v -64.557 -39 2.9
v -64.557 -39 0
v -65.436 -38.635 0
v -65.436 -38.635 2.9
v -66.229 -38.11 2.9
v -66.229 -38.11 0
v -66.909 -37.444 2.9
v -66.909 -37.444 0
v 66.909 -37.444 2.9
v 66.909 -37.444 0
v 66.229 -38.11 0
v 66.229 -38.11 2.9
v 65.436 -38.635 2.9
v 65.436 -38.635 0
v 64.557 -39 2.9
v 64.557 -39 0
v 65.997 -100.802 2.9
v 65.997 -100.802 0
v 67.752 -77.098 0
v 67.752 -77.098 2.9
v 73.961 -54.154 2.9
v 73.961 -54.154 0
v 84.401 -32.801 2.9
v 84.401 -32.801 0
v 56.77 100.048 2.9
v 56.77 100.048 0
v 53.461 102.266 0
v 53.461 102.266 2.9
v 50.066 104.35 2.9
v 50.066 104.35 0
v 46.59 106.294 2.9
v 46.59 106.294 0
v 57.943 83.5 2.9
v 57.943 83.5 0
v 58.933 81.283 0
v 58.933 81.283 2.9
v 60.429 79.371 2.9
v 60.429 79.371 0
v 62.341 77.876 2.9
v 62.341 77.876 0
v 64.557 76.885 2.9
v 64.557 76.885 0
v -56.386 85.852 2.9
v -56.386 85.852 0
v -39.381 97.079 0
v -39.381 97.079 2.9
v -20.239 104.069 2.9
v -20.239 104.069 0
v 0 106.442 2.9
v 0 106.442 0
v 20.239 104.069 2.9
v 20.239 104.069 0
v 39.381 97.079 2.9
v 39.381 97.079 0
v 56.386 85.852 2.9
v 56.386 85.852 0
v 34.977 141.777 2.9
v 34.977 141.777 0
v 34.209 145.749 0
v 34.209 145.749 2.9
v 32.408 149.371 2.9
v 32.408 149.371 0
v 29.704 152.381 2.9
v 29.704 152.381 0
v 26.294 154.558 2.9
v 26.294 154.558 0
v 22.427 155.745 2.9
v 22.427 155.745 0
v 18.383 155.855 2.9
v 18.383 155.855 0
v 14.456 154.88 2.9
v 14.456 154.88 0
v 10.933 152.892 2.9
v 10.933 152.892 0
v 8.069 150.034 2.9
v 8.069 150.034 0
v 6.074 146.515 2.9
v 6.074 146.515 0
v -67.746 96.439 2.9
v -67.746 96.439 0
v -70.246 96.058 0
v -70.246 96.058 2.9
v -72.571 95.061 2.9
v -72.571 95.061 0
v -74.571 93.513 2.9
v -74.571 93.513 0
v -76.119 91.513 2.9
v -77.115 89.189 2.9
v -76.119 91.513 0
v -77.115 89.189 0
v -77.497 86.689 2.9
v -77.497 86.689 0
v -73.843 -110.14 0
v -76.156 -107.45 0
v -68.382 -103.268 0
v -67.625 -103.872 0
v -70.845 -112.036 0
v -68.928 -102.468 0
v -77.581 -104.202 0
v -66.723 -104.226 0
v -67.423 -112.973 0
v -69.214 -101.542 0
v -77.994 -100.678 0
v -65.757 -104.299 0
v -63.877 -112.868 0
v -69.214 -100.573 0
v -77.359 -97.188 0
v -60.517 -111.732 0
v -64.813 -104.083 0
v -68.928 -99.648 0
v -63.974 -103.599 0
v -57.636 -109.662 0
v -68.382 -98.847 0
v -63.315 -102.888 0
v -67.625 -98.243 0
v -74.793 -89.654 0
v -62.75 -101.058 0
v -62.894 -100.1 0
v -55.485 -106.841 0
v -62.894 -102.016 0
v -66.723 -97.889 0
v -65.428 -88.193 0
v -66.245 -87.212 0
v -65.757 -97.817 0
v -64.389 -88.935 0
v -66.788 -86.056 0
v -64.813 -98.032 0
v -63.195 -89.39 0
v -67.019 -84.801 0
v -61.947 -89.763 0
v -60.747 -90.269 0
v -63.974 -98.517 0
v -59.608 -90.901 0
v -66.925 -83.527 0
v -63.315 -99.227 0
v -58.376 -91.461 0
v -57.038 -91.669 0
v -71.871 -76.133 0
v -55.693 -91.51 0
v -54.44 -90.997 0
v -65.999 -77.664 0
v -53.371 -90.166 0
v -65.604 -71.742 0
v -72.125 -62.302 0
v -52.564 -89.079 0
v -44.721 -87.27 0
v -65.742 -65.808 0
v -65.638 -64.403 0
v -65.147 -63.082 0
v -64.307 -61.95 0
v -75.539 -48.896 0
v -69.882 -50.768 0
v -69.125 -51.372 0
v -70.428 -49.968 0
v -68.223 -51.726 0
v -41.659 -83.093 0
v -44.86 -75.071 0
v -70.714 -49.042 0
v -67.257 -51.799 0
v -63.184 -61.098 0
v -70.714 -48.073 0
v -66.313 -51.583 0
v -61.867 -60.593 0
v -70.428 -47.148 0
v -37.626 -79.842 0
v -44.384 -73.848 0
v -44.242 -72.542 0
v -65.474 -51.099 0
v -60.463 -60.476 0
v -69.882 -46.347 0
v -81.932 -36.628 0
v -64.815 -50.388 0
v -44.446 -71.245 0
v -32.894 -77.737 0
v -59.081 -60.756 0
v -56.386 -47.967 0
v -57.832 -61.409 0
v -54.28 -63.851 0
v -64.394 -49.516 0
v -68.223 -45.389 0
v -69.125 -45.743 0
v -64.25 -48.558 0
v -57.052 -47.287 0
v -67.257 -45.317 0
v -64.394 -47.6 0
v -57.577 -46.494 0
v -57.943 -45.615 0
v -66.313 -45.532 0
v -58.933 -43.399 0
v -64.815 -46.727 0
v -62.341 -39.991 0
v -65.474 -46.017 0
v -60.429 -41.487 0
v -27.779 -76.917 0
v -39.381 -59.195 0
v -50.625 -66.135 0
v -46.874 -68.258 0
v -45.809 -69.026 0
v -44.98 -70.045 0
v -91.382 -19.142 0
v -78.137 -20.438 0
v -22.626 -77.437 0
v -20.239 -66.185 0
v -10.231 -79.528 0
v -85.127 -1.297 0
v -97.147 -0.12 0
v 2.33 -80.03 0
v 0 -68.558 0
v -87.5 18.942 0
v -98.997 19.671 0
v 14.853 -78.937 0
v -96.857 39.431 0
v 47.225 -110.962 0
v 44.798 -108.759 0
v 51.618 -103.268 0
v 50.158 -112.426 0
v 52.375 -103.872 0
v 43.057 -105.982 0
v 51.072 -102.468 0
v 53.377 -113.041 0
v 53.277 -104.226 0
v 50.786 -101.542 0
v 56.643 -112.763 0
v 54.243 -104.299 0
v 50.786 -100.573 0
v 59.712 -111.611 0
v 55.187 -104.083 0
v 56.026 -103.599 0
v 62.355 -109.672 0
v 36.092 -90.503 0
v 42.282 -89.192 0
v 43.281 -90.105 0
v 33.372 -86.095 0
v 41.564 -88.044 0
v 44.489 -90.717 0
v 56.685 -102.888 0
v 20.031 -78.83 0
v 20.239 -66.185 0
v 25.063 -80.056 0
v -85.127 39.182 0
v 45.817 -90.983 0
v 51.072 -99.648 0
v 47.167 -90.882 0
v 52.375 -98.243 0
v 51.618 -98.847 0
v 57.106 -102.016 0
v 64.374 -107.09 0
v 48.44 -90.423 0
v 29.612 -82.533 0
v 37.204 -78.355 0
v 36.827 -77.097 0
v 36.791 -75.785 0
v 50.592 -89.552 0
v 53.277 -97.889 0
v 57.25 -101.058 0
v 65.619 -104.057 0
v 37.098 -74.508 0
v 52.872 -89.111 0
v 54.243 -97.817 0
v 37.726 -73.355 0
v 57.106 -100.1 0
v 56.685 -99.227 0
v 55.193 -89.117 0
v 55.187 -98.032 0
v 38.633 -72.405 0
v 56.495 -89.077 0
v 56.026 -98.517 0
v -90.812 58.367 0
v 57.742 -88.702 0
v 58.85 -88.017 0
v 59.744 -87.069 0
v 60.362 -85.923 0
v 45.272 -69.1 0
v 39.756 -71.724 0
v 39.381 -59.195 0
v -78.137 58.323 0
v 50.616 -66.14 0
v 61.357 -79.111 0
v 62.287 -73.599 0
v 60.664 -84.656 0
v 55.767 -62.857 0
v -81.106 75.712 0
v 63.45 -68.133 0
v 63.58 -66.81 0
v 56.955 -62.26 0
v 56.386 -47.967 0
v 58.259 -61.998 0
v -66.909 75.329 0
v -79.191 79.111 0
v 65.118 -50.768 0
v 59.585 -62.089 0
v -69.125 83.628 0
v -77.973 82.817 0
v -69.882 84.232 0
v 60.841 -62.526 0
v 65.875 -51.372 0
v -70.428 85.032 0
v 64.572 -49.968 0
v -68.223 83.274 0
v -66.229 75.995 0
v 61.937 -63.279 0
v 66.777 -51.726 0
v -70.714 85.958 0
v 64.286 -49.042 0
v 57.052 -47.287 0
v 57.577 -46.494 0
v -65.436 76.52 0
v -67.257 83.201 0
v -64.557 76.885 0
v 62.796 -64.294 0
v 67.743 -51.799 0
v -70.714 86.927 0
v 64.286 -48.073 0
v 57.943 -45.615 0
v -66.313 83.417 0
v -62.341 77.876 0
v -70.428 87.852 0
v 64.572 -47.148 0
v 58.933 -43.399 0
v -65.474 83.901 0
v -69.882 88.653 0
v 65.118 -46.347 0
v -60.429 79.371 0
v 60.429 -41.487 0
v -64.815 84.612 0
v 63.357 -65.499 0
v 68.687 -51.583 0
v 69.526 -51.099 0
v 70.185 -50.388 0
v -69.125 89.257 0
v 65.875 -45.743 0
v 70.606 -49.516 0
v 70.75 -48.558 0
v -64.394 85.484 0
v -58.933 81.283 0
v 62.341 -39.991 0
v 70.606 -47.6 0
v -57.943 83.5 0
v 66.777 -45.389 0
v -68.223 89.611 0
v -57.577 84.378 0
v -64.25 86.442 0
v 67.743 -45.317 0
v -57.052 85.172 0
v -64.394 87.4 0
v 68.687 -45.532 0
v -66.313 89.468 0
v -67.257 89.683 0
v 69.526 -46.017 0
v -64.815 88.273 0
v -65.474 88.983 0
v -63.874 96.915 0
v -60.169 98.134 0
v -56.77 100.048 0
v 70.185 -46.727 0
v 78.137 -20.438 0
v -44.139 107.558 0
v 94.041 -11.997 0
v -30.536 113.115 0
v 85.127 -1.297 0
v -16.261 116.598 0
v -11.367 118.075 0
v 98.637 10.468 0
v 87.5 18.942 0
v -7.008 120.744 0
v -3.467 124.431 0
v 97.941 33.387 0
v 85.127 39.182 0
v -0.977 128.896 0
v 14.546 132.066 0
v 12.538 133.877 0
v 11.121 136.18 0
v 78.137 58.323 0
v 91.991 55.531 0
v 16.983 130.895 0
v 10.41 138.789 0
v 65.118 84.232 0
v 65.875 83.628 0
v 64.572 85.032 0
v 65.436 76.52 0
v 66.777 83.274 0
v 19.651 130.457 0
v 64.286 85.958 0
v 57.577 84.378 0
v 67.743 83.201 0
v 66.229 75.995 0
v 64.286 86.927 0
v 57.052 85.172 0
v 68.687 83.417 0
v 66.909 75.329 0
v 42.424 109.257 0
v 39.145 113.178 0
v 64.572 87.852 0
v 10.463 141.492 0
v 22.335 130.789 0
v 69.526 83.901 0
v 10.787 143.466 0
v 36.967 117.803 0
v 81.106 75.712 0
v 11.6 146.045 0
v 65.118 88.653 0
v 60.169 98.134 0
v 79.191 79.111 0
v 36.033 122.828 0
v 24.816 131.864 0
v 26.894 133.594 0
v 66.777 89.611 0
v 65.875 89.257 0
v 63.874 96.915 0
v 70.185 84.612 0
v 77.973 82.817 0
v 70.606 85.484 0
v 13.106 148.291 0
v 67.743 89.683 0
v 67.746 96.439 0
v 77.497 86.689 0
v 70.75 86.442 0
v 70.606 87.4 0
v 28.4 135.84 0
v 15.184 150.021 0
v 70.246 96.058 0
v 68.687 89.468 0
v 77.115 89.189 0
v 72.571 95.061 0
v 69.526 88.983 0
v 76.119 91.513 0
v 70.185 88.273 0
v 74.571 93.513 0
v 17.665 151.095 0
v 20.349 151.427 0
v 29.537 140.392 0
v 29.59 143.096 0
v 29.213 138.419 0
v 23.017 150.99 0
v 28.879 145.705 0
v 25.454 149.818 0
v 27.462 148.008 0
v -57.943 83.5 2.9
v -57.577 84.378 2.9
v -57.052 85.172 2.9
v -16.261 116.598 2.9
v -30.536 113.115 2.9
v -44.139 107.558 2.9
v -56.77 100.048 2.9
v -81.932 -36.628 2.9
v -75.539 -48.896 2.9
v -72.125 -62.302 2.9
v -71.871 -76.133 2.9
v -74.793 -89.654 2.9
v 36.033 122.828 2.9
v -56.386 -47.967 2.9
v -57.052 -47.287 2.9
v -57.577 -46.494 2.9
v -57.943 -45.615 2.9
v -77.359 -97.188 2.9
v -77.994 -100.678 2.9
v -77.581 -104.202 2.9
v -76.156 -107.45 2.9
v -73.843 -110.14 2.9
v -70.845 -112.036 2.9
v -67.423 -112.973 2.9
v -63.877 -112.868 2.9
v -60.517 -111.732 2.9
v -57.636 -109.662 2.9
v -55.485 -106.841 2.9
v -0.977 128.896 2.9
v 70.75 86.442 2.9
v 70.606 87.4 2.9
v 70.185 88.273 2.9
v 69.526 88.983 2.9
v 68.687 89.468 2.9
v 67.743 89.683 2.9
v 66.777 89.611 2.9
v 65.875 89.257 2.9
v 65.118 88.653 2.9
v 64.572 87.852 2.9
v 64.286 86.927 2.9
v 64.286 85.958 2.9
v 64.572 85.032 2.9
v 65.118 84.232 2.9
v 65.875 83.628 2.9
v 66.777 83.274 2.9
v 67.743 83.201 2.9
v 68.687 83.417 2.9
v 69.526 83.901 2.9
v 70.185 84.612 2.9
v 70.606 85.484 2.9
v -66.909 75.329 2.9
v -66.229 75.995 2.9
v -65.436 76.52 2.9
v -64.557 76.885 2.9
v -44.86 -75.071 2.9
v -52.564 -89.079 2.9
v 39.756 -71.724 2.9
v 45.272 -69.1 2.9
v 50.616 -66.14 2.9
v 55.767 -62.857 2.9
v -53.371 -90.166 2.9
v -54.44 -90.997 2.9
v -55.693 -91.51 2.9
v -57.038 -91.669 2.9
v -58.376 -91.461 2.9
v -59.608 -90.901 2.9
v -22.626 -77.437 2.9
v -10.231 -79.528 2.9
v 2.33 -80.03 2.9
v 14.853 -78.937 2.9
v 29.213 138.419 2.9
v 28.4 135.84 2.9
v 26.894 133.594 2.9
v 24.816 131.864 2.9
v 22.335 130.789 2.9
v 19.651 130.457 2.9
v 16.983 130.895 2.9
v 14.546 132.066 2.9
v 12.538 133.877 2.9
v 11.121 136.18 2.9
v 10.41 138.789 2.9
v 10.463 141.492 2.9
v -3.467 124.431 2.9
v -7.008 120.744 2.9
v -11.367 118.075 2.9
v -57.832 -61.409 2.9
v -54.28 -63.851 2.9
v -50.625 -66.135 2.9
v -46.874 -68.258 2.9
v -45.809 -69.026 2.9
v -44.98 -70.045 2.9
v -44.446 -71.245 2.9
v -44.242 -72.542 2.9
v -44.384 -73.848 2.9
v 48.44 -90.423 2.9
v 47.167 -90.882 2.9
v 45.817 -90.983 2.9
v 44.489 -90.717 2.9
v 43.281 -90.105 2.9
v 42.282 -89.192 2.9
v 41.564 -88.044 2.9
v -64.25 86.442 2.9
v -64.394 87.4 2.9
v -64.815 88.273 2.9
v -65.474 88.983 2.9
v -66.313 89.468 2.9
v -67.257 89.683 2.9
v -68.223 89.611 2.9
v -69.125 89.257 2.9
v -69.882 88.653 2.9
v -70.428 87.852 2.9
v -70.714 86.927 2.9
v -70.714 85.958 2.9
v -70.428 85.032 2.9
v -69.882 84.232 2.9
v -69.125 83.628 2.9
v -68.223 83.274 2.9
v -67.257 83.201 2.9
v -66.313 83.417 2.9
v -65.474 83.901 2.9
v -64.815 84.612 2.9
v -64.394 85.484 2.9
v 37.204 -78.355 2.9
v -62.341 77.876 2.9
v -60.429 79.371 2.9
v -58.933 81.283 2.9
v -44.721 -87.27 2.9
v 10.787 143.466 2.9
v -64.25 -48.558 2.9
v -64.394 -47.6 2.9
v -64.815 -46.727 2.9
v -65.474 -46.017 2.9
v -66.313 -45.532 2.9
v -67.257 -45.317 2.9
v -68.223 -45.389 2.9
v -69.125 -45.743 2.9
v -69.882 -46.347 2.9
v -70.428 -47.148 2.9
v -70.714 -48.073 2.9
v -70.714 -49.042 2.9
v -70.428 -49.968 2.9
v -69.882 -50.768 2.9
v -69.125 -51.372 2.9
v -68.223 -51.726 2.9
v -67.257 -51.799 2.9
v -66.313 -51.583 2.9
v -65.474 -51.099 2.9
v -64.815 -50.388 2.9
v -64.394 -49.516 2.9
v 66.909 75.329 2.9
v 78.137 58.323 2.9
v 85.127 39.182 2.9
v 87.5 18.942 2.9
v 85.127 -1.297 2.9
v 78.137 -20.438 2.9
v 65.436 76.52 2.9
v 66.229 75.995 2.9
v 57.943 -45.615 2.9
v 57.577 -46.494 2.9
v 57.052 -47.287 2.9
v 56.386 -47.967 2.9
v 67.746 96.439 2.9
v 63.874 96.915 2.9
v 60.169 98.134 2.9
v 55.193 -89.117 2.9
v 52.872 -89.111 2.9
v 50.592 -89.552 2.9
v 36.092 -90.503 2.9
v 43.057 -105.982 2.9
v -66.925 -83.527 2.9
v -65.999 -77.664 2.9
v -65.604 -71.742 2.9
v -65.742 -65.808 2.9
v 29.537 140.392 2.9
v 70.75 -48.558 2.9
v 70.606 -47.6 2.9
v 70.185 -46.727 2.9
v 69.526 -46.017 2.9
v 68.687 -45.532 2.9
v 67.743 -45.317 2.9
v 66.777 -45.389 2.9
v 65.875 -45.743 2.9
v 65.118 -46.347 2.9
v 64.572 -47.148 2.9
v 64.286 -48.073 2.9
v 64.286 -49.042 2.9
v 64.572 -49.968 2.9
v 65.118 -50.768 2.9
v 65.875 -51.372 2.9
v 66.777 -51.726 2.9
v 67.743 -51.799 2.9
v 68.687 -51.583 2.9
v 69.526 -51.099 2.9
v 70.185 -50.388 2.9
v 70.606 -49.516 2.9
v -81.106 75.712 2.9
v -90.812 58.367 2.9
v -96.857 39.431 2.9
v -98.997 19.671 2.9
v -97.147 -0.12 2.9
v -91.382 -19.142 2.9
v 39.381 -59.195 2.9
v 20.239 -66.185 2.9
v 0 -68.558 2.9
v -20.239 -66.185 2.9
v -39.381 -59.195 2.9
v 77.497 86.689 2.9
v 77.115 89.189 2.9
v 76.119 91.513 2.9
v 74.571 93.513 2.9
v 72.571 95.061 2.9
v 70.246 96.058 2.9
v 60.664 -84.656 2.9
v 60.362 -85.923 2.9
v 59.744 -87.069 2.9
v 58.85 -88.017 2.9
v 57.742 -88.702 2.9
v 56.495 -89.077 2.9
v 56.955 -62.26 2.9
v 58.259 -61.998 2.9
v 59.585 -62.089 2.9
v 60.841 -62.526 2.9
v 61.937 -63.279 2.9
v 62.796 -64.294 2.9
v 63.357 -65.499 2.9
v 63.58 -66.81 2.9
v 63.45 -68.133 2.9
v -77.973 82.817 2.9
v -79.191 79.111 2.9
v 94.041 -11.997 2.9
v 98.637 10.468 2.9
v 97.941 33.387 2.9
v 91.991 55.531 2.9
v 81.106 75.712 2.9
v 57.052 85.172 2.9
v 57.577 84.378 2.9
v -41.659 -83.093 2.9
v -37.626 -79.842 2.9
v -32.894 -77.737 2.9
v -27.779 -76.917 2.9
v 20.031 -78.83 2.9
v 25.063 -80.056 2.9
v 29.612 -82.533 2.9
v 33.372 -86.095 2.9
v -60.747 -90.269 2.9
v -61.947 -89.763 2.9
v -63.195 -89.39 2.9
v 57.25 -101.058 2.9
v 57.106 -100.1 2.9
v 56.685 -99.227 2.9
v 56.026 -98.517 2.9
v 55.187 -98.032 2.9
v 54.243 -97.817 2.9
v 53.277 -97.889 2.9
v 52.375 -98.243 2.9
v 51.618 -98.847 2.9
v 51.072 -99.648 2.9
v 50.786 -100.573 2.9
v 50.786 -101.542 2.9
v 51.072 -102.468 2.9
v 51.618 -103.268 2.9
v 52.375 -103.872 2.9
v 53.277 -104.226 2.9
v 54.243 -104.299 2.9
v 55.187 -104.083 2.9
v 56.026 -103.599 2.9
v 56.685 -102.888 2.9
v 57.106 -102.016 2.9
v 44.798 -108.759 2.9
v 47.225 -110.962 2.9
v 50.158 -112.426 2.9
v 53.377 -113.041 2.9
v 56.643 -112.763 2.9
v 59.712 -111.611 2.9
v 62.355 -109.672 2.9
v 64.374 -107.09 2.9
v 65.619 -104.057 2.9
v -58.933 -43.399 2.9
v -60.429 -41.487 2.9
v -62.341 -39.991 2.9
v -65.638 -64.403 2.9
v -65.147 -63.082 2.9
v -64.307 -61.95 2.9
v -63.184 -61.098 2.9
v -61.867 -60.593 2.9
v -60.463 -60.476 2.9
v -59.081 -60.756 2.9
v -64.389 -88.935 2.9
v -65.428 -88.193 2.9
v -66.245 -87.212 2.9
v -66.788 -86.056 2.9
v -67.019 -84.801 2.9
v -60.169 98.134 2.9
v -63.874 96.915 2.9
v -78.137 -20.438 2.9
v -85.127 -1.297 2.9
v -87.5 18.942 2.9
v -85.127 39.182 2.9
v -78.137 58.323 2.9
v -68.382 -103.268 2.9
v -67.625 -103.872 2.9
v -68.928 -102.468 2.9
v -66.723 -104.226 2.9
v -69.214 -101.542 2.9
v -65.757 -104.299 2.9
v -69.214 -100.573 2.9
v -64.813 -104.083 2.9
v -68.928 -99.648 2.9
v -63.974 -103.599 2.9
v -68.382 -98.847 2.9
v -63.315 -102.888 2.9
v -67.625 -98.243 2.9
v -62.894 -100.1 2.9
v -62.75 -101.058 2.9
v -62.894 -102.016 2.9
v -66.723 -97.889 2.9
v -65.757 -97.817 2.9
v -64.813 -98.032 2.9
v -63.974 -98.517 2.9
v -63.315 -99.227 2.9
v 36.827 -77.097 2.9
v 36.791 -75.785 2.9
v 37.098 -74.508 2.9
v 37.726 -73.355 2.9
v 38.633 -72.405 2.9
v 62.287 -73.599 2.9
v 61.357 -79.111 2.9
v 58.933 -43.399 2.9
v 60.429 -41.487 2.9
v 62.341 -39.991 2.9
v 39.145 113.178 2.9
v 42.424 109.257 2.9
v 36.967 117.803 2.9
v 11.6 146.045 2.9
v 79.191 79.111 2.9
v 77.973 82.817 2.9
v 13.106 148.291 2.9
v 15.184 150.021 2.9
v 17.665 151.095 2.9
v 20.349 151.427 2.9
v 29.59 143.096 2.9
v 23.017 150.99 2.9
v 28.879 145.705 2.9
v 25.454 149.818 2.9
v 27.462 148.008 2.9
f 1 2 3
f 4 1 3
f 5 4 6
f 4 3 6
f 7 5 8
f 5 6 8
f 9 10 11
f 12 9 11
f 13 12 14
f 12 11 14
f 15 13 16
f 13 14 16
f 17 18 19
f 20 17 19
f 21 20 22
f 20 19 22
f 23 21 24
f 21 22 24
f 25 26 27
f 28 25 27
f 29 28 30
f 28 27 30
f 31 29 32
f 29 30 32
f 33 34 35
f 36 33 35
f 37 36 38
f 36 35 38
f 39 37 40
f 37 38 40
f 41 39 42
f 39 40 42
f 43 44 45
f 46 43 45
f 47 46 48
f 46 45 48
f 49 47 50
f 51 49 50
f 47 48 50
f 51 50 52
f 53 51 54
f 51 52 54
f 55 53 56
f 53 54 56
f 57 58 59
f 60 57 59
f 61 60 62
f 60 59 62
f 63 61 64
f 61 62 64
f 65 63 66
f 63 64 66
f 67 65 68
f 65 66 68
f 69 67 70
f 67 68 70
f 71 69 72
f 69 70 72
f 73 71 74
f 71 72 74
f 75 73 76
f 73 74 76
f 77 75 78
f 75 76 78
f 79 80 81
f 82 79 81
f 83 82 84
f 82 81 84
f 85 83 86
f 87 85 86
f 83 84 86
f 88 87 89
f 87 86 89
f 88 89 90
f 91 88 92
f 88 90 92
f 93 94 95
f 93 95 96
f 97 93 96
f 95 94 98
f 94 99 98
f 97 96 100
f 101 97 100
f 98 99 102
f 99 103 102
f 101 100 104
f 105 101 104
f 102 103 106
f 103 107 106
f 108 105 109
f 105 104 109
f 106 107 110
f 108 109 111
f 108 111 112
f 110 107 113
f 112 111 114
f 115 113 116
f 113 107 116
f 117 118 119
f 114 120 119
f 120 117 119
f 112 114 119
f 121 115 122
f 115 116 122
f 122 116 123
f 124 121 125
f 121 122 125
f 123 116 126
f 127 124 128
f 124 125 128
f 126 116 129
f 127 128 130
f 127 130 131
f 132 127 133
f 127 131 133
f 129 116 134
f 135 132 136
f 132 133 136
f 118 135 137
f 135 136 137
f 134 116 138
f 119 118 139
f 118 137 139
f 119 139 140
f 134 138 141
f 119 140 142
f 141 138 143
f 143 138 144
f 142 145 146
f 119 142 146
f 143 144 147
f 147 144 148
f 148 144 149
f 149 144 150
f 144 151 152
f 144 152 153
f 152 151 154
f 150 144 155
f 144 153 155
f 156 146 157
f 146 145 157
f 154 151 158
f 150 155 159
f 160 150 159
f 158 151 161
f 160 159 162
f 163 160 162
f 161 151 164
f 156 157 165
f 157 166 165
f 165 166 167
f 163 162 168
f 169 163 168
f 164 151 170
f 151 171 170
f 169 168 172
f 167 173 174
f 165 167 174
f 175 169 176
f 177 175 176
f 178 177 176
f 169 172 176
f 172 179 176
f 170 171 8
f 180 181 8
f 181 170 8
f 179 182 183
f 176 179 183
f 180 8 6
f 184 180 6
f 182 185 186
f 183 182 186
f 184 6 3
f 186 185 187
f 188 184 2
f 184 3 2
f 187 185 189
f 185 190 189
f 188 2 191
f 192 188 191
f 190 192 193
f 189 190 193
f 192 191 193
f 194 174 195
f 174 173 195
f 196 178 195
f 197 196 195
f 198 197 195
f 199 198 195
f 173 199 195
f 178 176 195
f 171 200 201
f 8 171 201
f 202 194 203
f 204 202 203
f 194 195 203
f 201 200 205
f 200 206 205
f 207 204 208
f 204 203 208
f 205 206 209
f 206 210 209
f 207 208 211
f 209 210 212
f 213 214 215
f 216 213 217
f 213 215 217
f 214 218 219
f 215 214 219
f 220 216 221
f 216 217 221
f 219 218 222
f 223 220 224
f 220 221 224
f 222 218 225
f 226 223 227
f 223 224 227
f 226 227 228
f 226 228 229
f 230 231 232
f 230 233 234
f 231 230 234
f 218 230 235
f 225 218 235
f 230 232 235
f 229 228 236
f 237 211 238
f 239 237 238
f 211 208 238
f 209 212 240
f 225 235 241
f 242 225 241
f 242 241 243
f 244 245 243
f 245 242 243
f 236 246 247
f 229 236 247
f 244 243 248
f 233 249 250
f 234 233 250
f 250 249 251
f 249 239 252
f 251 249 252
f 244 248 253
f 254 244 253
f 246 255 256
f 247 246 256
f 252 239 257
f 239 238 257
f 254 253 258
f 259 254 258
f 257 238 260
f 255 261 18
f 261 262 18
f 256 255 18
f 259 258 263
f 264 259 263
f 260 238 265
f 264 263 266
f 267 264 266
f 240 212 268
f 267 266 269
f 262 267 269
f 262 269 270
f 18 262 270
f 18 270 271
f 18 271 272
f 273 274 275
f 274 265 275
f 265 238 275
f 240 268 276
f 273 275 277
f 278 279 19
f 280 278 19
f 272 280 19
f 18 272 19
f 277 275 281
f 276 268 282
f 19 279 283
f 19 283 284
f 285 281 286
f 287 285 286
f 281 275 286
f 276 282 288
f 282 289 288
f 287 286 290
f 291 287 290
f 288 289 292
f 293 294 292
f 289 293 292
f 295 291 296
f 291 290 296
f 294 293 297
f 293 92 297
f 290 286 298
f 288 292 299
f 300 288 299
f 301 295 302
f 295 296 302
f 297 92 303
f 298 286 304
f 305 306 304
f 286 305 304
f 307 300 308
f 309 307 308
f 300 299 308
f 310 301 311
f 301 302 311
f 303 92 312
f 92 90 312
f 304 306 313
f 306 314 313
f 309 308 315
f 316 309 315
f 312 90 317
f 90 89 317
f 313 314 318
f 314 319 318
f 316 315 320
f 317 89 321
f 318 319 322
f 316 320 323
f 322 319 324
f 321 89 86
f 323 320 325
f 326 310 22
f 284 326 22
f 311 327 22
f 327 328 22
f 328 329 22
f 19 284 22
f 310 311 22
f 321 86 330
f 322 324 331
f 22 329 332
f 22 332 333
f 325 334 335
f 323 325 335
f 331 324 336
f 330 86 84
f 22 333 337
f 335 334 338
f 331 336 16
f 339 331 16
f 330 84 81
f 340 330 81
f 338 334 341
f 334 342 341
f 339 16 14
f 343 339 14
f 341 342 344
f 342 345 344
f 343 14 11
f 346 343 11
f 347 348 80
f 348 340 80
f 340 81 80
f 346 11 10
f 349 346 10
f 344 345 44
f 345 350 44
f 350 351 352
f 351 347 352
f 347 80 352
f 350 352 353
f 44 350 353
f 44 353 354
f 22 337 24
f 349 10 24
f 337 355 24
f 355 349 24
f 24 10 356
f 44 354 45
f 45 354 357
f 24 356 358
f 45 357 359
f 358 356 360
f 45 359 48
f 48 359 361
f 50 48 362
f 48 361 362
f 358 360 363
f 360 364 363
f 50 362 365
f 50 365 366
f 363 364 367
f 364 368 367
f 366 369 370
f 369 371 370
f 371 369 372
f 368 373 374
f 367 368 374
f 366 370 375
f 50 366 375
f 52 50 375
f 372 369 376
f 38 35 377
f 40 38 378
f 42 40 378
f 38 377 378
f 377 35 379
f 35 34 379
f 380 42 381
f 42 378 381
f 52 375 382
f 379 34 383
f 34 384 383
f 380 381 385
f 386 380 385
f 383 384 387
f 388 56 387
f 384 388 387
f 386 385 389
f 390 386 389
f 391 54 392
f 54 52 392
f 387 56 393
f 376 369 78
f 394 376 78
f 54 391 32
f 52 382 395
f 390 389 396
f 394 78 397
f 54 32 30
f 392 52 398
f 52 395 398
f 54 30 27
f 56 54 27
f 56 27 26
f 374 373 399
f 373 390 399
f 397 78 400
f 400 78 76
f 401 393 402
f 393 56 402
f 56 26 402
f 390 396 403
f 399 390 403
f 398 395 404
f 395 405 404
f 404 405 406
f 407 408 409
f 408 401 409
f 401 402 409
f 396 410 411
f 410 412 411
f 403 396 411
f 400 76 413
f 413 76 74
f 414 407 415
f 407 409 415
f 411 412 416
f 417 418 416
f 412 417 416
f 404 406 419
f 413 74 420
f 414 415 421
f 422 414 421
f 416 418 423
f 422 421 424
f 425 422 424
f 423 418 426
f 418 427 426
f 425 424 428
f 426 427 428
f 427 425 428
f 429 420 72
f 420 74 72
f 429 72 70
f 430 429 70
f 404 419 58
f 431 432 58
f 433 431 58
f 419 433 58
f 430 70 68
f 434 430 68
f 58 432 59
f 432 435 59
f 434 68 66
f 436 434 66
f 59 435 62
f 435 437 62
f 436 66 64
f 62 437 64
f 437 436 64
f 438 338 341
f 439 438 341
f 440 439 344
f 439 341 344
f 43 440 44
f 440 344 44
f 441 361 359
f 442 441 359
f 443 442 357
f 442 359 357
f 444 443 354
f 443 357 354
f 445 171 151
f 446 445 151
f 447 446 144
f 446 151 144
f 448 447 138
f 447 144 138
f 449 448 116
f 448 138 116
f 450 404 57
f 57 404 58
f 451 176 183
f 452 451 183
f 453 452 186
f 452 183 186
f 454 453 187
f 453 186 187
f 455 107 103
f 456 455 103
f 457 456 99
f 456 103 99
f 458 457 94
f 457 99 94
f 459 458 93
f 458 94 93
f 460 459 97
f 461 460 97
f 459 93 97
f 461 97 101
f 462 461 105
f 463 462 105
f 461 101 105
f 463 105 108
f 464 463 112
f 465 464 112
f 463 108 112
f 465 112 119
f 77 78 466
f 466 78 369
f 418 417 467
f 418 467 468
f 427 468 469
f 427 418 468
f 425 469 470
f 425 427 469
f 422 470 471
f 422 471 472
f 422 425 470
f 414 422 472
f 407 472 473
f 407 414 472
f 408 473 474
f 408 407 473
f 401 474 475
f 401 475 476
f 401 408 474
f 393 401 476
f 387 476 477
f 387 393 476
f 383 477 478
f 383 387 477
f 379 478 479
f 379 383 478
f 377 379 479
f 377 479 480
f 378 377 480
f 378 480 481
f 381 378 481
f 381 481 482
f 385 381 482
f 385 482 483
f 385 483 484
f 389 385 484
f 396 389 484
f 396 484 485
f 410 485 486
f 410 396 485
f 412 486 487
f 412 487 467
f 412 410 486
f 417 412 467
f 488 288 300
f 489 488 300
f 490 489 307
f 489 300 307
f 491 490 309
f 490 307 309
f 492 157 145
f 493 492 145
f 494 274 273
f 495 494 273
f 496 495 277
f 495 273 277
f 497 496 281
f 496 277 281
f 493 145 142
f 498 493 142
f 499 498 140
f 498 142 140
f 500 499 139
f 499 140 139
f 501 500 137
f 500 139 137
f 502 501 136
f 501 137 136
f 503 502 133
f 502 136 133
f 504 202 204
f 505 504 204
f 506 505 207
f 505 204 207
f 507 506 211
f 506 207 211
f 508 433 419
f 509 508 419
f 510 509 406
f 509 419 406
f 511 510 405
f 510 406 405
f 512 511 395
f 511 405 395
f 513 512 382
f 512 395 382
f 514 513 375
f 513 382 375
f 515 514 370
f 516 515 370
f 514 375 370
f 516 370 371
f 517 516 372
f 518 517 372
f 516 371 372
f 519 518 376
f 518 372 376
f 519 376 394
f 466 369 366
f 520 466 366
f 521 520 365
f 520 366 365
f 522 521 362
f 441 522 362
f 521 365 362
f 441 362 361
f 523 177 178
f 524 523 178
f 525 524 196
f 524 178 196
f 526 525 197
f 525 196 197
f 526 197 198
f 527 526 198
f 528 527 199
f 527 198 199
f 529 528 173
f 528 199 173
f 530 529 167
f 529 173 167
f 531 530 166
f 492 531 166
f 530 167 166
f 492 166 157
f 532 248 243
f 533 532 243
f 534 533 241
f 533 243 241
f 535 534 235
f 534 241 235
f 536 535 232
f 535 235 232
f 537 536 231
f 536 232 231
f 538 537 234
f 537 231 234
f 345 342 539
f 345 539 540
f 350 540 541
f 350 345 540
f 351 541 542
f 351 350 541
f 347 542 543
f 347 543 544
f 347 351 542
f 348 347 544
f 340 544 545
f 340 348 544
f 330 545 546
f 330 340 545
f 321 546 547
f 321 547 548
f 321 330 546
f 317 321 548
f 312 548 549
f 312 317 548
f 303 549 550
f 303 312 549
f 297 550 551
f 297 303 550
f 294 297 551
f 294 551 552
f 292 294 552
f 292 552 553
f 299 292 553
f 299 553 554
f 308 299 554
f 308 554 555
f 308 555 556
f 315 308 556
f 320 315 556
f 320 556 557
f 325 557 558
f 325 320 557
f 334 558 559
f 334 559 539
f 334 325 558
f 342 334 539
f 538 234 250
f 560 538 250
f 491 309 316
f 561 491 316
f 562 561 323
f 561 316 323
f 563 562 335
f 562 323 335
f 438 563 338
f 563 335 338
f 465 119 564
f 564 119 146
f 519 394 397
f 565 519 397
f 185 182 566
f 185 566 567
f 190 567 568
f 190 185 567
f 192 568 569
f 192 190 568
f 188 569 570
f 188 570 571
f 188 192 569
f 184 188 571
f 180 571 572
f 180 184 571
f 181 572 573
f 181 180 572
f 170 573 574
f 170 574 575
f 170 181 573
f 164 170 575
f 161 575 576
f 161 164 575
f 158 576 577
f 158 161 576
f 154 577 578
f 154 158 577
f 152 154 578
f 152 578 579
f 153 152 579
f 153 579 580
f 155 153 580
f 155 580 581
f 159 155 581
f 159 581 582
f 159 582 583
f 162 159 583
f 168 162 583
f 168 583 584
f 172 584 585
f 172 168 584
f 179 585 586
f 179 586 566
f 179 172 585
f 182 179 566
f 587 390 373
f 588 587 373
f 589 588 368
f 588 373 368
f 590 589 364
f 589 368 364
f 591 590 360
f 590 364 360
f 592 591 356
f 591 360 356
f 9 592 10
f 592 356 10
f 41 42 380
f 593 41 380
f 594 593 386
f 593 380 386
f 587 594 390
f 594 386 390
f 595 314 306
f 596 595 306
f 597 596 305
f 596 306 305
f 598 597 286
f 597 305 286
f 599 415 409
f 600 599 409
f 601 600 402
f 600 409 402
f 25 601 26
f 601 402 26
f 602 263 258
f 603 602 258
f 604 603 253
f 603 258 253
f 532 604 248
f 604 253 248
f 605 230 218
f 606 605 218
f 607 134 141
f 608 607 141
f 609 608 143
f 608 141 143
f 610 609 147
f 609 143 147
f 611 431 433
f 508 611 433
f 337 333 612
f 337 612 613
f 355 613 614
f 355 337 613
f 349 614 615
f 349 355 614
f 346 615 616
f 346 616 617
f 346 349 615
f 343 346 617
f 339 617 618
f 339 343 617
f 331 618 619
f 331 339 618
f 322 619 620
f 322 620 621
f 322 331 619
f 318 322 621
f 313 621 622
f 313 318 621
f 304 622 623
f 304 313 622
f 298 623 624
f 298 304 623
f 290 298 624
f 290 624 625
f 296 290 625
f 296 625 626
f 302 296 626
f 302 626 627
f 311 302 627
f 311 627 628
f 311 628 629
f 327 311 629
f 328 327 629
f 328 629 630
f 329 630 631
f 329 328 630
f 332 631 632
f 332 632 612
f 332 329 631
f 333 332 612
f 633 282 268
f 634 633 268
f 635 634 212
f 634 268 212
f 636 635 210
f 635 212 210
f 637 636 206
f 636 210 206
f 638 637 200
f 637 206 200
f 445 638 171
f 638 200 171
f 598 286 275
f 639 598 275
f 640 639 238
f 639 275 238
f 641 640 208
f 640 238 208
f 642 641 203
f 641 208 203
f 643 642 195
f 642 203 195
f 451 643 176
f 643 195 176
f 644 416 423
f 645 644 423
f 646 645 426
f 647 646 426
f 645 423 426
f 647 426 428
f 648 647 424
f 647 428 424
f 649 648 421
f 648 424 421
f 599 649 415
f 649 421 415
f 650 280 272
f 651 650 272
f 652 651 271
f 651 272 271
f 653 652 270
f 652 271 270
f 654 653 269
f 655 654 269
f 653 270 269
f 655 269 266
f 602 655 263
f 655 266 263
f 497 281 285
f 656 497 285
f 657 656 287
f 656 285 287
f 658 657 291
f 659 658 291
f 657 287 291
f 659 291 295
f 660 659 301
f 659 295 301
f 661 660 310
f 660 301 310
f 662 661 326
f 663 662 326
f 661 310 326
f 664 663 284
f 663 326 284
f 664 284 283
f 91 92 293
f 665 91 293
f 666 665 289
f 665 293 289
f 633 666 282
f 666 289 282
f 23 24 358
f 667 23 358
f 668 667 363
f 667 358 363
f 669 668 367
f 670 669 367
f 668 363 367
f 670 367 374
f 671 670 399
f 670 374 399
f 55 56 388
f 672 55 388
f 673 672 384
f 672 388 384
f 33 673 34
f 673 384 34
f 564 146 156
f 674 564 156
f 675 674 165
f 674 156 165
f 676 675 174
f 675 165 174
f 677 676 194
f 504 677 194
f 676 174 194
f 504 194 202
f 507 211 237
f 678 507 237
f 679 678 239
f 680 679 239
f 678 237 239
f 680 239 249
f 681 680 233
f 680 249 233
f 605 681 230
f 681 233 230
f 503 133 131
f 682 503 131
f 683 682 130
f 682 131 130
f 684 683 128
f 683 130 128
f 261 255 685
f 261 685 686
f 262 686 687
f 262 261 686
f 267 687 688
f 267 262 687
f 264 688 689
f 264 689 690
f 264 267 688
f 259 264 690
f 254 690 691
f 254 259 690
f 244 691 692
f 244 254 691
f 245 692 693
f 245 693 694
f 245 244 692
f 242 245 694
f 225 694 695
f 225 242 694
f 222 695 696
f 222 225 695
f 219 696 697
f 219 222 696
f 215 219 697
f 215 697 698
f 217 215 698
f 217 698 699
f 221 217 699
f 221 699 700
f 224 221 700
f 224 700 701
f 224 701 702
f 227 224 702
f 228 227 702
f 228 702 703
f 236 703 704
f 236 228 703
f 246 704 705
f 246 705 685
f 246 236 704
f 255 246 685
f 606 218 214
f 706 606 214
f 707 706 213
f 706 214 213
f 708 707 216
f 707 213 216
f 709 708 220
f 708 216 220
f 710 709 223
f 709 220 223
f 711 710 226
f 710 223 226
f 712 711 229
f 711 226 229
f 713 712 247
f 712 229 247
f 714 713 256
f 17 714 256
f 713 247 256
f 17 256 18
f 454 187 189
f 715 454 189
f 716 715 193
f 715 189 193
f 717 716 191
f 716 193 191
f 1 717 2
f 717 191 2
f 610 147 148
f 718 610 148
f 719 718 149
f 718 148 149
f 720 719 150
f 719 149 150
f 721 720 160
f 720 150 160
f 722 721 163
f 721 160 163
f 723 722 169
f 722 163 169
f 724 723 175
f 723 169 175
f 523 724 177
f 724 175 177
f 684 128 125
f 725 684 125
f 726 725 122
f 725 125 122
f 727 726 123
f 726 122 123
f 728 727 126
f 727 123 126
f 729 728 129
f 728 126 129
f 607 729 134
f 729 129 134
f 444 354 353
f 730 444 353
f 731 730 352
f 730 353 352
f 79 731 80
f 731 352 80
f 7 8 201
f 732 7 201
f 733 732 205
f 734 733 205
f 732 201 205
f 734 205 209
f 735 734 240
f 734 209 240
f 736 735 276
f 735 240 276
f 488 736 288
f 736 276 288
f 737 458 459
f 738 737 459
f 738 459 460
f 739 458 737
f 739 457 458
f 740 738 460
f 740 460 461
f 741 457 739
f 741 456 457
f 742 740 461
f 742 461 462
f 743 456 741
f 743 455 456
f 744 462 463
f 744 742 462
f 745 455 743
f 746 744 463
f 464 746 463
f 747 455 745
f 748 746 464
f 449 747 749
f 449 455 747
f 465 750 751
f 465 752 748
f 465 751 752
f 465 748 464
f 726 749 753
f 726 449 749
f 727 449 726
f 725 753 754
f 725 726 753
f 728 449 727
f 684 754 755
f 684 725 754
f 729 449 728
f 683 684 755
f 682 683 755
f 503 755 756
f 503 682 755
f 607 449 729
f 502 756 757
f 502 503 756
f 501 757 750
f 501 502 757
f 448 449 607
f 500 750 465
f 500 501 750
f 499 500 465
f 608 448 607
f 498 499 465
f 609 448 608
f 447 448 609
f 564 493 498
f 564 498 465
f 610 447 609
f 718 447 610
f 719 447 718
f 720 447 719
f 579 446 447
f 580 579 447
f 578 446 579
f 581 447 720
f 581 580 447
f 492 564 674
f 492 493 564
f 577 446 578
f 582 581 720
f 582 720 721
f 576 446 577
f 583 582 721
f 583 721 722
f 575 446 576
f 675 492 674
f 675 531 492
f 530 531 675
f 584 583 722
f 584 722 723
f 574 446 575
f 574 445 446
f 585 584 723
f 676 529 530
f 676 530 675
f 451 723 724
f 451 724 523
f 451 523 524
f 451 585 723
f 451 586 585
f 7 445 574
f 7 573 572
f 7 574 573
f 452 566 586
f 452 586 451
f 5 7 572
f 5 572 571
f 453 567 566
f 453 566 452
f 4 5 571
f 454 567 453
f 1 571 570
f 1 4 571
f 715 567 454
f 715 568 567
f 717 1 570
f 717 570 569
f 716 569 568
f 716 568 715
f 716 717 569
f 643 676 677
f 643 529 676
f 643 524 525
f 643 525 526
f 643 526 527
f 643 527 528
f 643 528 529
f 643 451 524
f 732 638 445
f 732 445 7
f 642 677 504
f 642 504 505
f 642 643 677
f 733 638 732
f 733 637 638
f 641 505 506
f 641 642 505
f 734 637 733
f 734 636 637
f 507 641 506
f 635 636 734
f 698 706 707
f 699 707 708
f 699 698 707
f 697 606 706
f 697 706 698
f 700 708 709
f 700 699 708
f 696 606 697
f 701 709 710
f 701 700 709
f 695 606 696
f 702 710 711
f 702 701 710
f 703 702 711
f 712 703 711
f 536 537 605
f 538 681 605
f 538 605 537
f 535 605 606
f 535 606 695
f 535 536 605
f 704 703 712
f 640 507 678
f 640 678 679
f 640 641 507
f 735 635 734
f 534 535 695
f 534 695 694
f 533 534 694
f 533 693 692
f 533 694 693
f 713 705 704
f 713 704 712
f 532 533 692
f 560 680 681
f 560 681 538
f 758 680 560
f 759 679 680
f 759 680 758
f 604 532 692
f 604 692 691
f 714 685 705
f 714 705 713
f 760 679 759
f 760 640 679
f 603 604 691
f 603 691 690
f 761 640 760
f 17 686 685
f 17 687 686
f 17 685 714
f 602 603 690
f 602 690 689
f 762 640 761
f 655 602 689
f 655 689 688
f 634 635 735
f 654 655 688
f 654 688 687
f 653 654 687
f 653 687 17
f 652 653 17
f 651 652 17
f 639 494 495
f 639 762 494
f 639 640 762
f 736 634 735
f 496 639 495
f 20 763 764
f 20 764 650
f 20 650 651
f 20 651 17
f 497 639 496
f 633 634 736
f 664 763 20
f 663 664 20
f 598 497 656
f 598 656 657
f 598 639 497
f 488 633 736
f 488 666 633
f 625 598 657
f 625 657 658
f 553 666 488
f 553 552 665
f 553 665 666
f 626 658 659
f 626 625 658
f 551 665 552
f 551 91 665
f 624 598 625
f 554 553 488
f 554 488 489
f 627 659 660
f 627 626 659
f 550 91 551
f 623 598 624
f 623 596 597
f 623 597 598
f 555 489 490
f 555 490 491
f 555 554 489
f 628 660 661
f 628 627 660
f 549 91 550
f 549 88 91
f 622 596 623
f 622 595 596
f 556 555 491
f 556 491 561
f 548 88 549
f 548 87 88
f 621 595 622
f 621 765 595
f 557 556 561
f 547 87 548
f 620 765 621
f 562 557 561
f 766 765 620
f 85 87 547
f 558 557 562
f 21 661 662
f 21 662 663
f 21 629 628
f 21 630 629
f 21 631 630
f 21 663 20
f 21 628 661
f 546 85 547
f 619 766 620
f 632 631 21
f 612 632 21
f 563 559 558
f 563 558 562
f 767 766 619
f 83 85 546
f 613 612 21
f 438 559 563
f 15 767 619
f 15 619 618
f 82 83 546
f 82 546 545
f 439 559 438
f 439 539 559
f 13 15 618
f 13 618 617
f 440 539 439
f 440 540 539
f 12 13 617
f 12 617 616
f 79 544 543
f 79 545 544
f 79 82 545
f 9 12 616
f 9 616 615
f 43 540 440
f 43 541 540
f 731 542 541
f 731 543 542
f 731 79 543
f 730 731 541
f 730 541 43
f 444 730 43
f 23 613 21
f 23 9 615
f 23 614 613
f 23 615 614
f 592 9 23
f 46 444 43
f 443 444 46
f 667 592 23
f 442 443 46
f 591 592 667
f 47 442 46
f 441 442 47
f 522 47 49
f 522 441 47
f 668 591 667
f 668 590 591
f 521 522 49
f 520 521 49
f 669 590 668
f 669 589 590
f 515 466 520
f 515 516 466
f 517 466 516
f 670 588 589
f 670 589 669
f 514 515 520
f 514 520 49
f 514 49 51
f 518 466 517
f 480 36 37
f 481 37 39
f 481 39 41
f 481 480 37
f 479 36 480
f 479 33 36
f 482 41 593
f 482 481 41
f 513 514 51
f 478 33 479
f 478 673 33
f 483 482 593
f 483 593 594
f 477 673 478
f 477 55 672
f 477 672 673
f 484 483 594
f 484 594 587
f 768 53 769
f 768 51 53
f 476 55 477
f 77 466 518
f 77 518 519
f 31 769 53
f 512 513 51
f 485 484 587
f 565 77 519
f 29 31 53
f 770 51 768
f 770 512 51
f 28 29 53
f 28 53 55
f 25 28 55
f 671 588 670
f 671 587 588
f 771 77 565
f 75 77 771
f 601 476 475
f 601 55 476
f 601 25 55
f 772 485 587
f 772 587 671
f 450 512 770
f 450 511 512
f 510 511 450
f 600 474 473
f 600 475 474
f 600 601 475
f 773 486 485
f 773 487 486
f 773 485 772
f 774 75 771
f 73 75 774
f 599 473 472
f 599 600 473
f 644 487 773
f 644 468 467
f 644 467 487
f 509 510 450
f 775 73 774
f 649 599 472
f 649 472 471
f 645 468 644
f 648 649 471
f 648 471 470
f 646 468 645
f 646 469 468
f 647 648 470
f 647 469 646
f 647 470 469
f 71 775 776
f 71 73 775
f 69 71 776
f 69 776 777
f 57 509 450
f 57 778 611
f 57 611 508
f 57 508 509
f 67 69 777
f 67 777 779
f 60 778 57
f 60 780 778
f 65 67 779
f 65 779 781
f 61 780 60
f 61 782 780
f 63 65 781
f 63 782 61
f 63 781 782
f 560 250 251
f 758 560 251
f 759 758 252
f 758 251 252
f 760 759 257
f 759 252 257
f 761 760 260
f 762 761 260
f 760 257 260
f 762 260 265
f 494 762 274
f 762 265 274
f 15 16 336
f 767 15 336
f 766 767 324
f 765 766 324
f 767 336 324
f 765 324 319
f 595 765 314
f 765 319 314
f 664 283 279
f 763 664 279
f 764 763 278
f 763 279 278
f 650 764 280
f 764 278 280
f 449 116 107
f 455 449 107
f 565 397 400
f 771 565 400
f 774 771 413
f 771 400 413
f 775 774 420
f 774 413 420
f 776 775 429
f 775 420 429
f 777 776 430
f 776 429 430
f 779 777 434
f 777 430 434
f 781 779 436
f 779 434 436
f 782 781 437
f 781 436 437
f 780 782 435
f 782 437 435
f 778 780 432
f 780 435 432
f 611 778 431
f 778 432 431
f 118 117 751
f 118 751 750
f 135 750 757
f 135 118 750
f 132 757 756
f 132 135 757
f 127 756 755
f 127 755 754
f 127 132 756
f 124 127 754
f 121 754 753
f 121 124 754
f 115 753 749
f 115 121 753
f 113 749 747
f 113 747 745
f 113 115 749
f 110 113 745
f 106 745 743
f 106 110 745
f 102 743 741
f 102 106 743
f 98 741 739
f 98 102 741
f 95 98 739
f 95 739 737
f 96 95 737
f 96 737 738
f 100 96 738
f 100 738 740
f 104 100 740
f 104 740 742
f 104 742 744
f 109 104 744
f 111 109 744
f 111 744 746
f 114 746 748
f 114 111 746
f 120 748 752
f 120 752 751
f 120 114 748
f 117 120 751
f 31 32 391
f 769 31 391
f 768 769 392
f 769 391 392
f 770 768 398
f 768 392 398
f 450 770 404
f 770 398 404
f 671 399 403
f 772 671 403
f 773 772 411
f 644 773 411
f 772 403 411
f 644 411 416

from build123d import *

# Parameters (mm, degrees)
F0_R     = 3.25
F1_DEPTH = 2.9


# Not quite as in the source:
# - ends of sketch curves that miss each other by under 0.0002 mm in the source are joined


with BuildPart() as f1:
    # F0 (on Top) → F1 (new body)
    with BuildSketch(Plane.XY):
        with BuildLine():
            ThreePointArc((-44.7213694768, -87.2696897378), (-35.3282259069, -78.6355727138), (-22.6261189451, -77.437406766))
            ThreePointArc((-22.6261189451, -77.437406766), (-3.9584138319, -79.9784717794), (14.8526419701, -78.9371528028))
            ThreePointArc((14.8526419701, -78.9371528028), (27.4184013914, -81.1464387638), (36.0916099164, -90.5034990376))
            Line((36.0916099164, -90.5034990376), (43.056946, -105.982018))
            ThreePointArc((43.056946, -105.982018), (56.6433108611, -112.762891287), (65.9972675289, -100.8015700101))
            ThreePointArc((65.9972675289, -100.8015700101), (70.3098677706, -65.4781038722), (84.4013998186, -32.8012868888))
            ThreePointArc((84.4013998186, -32.8012868888), (98.9543772418, 21.9475596078), (81.1058809507, 75.7123879655))
            ThreePointArc((81.1058809507, 75.7123879655), (78.4915241697, 80.9342205742), (77.4969704068, 86.68861601))
            ThreePointArc((77.4969704068, 86.68861601), (74.5710678119, 93.5134278119), (67.7462419947, 96.4393277843))
            ThreePointArc((67.7462419947, 96.4393277843), (61.9918305742, 97.4338841697), (56.7700159448, 100.0482399211))
            ThreePointArc((56.7700159448, 100.0482399211), (51.7741884012, 103.3250206324), (46.589782882, 106.2944757787))
            ThreePointArc((46.589782882, 106.2944757787), (39.1449717302, 113.1782098516), (36.0328533434, 122.8283870191))
            Line((36.0328533434, 122.8283870191), (34.976746, 141.777077))
            ThreePointArc((34.976746, 141.777077), (22.4266252093, 155.7447750088), (6.0736789634, 146.5152930146))
            Line((6.0736789634, 146.5152930146), (-0.977233, 128.895637))
            ThreePointArc((-0.977233, 128.895637), (-7.0076373704, 120.7442287718), (-16.2606700755, 116.5978324535))
            ThreePointArc((-16.2606700755, 116.5978324535), (-37.4411993299, 110.5892726198), (-56.7700327307, 100.0482376153))
            ThreePointArc((-56.7700327307, 100.0482376153), (-61.9918290994, 97.4338843258), (-67.7462240106, 96.4393304314))
            ThreePointArc((-67.7462240106, 96.4393304314), (-74.5710678119, 93.5134278119), (-77.4969677843, 86.6886019947))
            ThreePointArc((-77.4969677843, 86.6886019947), (-78.4915233258, 80.9342200994), (-81.1058789211, 75.7124059448))
            ThreePointArc((-81.1058789211, 75.7124059448), (-98.9973221942, 19.6705072268), (-81.9321709394, -36.6284899589))
            ThreePointArc((-81.9321709394, -36.6284899589), (-72.1246020826, -62.3015797591), (-74.7927308672, -89.6544180452))
            Line((-74.7927308672, -89.6544180452), (-77.359069, -97.188309))
            ThreePointArc((-77.359069, -97.188309), (-70.8446126339, -112.0362432093), (-55.4854090748, -106.8406649589))
            Line((-55.4854090748, -106.8406649589), (-44.7213694768, -87.2696897378))
        make_face()
        with Locations((-66, -101.05764)):
            Circle(F0_R, mode=Mode.SUBTRACT)
        with BuildLine():
            ThreePointArc((-52.5642634566, -89.0792787489), (-55.6931843813, -91.5103563164), (-59.6084751577, -90.9014372506))
            ThreePointArc((-59.6084751577, -90.9014372506), (-61.3402321592, -89.9993144635), (-63.1953610952, -89.3899923959))
            ThreePointArc((-63.1953610952, -89.3899923959), (-66.2453647932, -87.2123878479), (-66.9254446607, -83.5270150694))
            ThreePointArc((-66.9254446607, -83.5270150694), (-65.7348712362, -74.7077507104), (-65.7415821416, -65.8084890097))
            ThreePointArc((-65.7415821416, -65.8084890097), (-63.1835418456, -61.0980378443), (-57.8323762514, -61.4094713493))
            ThreePointArc((-57.8323762514, -61.4094713493), (-52.4648777131, -65.01260773), (-46.8736571173, -68.2577562181))
            ThreePointArc((-46.8736571173, -68.2577562181), (-44.4460535436, -71.2446768384), (-44.8599474566, -75.0713907489))
            Line((-44.8599474566, -75.0713907489), (-52.5642634566, -89.0792787489))
        make_face(mode=Mode.SUBTRACT)
        with Locations((-67.5, -48.55764)):
            Circle(F0_R, mode=Mode.SUBTRACT)
        with Locations((54, -101.05764)):
            Circle(F0_R, mode=Mode.SUBTRACT)
        with BuildLine():
            ThreePointArc((55.7668649484, -62.8565289244), (61.4137793469, -62.8660371217), (63.450485388, -68.1328730913))
            ThreePointArc((63.450485388, -68.1328730913), (61.7927741104, -76.349981087), (60.66398801, -84.656313001))
            ThreePointArc((60.66398801, -84.656313001), (58.8502515766, -88.0169614514), (55.1933120197, -89.1171158029))
            ThreePointArc((55.1933120197, -89.1171158029), (51.7212938161, -89.2759806038), (48.4404431818, -90.4231993478))
            ThreePointArc((48.4404431818, -90.4231993478), (44.4890186454, -90.7173209458), (41.5643552496, -88.0440028877))
            Line((41.5643552496, -88.0440028877), (37.204438, -78.355278))
            ThreePointArc((37.204438, -78.355278), (37.0976309763, -74.5077318057), (39.7561530447, -71.7243331019))
            ThreePointArc((39.7561530447, -71.7243331019), (47.9668749837, -67.6612132767), (55.7668649484, -62.8565289244))
        make_face(mode=Mode.SUBTRACT)
        with Locations((67.5, -48.55764)):
            Circle(F0_R, mode=Mode.SUBTRACT)
        with BuildLine():
            ThreePointArc((-57.9428097278, 83.4995499162), (-57.3338219129, 84.7875612773), (-56.3862887981, 85.8515257605))
            ThreePointArc((-56.3862887981, 85.8515257605), (-1.4091e-06, 106.44236), (56.3862897755, 85.8515247336))
            ThreePointArc((56.3862897755, 85.8515247336), (57.3338226492, 84.7875616758), (57.9428104466, 83.4995508296))
            ThreePointArc((57.9428104466, 83.4995508296), (60.4289318502, 79.371292526), (64.557188973, 76.8851709122))
            ThreePointArc((64.557188973, 76.8851709122), (65.8452017985, 76.276181568), (66.9091657605, 75.3286487981))
            ThreePointArc((66.9091657605, 75.3286487981), (87.5, 18.94236), (66.9091656417, -37.443928698))
            ThreePointArc((66.9091656417, -37.443928698), (65.8452017985, -38.391461568), (64.5571911108, -39.00044936))
            ThreePointArc((64.5571911108, -39.00044936), (60.4289318502, -41.486572526), (57.942810631, -45.6148298864))
            ThreePointArc((57.942810631, -45.6148298864), (57.3338226492, -46.9028416758), (56.3862897981, -47.9668057605))
            ThreePointArc((56.3862897981, -47.9668057605), (-1.4091e-06, -68.55764), (-56.3862919305, -47.9668029175))
            ThreePointArc((-56.3862919305, -47.9668029175), (-57.3338219129, -46.9028412773), (-57.9428097278, -45.6148299162))
            ThreePointArc((-57.9428097278, -45.6148299162), (-60.4289318502, -41.486572526), (-64.5571880596, -39.0004511935))
            ThreePointArc((-64.5571880596, -39.0004511935), (-65.8452006758, -38.3914616492), (-66.9091647605, -37.4439287981))
            ThreePointArc((-66.9091647605, -37.4439287981), (-87.5, 18.94236), (-66.9091638256, 75.328650853))
            ThreePointArc((-66.9091638256, 75.328650853), (-65.8452006758, 76.2761816492), (-64.5571898296, 76.8851694466))
            ThreePointArc((-64.5571898296, 76.8851694466), (-60.4289318502, 79.371292526), (-57.9428097278, 83.4995499162))
        make_face(mode=Mode.SUBTRACT)
        with Locations((-67.5, 86.44236)):
            Circle(F0_R, mode=Mode.SUBTRACT)
        with BuildLine():
            ThreePointArc((10.7869112155, 143.4660389647), (21.6986369647, 151.3040387845), (29.5366367845, 140.3923130353))
            Line((29.5366367845, 140.3923130353), (29.213074, 138.418678))
            ThreePointArc((29.213074, 138.418678), (18.3013640353, 130.5806802155), (10.4633642155, 141.4924059647))
            Line((10.4633642155, 141.4924059647), (10.7869112155, 143.4660389647))
        make_face(mode=Mode.SUBTRACT)
        with Locations((67.5, 86.44236)):
            Circle(F0_R, mode=Mode.SUBTRACT)
    extrude(amount=F1_DEPTH)


solid = f1.part
